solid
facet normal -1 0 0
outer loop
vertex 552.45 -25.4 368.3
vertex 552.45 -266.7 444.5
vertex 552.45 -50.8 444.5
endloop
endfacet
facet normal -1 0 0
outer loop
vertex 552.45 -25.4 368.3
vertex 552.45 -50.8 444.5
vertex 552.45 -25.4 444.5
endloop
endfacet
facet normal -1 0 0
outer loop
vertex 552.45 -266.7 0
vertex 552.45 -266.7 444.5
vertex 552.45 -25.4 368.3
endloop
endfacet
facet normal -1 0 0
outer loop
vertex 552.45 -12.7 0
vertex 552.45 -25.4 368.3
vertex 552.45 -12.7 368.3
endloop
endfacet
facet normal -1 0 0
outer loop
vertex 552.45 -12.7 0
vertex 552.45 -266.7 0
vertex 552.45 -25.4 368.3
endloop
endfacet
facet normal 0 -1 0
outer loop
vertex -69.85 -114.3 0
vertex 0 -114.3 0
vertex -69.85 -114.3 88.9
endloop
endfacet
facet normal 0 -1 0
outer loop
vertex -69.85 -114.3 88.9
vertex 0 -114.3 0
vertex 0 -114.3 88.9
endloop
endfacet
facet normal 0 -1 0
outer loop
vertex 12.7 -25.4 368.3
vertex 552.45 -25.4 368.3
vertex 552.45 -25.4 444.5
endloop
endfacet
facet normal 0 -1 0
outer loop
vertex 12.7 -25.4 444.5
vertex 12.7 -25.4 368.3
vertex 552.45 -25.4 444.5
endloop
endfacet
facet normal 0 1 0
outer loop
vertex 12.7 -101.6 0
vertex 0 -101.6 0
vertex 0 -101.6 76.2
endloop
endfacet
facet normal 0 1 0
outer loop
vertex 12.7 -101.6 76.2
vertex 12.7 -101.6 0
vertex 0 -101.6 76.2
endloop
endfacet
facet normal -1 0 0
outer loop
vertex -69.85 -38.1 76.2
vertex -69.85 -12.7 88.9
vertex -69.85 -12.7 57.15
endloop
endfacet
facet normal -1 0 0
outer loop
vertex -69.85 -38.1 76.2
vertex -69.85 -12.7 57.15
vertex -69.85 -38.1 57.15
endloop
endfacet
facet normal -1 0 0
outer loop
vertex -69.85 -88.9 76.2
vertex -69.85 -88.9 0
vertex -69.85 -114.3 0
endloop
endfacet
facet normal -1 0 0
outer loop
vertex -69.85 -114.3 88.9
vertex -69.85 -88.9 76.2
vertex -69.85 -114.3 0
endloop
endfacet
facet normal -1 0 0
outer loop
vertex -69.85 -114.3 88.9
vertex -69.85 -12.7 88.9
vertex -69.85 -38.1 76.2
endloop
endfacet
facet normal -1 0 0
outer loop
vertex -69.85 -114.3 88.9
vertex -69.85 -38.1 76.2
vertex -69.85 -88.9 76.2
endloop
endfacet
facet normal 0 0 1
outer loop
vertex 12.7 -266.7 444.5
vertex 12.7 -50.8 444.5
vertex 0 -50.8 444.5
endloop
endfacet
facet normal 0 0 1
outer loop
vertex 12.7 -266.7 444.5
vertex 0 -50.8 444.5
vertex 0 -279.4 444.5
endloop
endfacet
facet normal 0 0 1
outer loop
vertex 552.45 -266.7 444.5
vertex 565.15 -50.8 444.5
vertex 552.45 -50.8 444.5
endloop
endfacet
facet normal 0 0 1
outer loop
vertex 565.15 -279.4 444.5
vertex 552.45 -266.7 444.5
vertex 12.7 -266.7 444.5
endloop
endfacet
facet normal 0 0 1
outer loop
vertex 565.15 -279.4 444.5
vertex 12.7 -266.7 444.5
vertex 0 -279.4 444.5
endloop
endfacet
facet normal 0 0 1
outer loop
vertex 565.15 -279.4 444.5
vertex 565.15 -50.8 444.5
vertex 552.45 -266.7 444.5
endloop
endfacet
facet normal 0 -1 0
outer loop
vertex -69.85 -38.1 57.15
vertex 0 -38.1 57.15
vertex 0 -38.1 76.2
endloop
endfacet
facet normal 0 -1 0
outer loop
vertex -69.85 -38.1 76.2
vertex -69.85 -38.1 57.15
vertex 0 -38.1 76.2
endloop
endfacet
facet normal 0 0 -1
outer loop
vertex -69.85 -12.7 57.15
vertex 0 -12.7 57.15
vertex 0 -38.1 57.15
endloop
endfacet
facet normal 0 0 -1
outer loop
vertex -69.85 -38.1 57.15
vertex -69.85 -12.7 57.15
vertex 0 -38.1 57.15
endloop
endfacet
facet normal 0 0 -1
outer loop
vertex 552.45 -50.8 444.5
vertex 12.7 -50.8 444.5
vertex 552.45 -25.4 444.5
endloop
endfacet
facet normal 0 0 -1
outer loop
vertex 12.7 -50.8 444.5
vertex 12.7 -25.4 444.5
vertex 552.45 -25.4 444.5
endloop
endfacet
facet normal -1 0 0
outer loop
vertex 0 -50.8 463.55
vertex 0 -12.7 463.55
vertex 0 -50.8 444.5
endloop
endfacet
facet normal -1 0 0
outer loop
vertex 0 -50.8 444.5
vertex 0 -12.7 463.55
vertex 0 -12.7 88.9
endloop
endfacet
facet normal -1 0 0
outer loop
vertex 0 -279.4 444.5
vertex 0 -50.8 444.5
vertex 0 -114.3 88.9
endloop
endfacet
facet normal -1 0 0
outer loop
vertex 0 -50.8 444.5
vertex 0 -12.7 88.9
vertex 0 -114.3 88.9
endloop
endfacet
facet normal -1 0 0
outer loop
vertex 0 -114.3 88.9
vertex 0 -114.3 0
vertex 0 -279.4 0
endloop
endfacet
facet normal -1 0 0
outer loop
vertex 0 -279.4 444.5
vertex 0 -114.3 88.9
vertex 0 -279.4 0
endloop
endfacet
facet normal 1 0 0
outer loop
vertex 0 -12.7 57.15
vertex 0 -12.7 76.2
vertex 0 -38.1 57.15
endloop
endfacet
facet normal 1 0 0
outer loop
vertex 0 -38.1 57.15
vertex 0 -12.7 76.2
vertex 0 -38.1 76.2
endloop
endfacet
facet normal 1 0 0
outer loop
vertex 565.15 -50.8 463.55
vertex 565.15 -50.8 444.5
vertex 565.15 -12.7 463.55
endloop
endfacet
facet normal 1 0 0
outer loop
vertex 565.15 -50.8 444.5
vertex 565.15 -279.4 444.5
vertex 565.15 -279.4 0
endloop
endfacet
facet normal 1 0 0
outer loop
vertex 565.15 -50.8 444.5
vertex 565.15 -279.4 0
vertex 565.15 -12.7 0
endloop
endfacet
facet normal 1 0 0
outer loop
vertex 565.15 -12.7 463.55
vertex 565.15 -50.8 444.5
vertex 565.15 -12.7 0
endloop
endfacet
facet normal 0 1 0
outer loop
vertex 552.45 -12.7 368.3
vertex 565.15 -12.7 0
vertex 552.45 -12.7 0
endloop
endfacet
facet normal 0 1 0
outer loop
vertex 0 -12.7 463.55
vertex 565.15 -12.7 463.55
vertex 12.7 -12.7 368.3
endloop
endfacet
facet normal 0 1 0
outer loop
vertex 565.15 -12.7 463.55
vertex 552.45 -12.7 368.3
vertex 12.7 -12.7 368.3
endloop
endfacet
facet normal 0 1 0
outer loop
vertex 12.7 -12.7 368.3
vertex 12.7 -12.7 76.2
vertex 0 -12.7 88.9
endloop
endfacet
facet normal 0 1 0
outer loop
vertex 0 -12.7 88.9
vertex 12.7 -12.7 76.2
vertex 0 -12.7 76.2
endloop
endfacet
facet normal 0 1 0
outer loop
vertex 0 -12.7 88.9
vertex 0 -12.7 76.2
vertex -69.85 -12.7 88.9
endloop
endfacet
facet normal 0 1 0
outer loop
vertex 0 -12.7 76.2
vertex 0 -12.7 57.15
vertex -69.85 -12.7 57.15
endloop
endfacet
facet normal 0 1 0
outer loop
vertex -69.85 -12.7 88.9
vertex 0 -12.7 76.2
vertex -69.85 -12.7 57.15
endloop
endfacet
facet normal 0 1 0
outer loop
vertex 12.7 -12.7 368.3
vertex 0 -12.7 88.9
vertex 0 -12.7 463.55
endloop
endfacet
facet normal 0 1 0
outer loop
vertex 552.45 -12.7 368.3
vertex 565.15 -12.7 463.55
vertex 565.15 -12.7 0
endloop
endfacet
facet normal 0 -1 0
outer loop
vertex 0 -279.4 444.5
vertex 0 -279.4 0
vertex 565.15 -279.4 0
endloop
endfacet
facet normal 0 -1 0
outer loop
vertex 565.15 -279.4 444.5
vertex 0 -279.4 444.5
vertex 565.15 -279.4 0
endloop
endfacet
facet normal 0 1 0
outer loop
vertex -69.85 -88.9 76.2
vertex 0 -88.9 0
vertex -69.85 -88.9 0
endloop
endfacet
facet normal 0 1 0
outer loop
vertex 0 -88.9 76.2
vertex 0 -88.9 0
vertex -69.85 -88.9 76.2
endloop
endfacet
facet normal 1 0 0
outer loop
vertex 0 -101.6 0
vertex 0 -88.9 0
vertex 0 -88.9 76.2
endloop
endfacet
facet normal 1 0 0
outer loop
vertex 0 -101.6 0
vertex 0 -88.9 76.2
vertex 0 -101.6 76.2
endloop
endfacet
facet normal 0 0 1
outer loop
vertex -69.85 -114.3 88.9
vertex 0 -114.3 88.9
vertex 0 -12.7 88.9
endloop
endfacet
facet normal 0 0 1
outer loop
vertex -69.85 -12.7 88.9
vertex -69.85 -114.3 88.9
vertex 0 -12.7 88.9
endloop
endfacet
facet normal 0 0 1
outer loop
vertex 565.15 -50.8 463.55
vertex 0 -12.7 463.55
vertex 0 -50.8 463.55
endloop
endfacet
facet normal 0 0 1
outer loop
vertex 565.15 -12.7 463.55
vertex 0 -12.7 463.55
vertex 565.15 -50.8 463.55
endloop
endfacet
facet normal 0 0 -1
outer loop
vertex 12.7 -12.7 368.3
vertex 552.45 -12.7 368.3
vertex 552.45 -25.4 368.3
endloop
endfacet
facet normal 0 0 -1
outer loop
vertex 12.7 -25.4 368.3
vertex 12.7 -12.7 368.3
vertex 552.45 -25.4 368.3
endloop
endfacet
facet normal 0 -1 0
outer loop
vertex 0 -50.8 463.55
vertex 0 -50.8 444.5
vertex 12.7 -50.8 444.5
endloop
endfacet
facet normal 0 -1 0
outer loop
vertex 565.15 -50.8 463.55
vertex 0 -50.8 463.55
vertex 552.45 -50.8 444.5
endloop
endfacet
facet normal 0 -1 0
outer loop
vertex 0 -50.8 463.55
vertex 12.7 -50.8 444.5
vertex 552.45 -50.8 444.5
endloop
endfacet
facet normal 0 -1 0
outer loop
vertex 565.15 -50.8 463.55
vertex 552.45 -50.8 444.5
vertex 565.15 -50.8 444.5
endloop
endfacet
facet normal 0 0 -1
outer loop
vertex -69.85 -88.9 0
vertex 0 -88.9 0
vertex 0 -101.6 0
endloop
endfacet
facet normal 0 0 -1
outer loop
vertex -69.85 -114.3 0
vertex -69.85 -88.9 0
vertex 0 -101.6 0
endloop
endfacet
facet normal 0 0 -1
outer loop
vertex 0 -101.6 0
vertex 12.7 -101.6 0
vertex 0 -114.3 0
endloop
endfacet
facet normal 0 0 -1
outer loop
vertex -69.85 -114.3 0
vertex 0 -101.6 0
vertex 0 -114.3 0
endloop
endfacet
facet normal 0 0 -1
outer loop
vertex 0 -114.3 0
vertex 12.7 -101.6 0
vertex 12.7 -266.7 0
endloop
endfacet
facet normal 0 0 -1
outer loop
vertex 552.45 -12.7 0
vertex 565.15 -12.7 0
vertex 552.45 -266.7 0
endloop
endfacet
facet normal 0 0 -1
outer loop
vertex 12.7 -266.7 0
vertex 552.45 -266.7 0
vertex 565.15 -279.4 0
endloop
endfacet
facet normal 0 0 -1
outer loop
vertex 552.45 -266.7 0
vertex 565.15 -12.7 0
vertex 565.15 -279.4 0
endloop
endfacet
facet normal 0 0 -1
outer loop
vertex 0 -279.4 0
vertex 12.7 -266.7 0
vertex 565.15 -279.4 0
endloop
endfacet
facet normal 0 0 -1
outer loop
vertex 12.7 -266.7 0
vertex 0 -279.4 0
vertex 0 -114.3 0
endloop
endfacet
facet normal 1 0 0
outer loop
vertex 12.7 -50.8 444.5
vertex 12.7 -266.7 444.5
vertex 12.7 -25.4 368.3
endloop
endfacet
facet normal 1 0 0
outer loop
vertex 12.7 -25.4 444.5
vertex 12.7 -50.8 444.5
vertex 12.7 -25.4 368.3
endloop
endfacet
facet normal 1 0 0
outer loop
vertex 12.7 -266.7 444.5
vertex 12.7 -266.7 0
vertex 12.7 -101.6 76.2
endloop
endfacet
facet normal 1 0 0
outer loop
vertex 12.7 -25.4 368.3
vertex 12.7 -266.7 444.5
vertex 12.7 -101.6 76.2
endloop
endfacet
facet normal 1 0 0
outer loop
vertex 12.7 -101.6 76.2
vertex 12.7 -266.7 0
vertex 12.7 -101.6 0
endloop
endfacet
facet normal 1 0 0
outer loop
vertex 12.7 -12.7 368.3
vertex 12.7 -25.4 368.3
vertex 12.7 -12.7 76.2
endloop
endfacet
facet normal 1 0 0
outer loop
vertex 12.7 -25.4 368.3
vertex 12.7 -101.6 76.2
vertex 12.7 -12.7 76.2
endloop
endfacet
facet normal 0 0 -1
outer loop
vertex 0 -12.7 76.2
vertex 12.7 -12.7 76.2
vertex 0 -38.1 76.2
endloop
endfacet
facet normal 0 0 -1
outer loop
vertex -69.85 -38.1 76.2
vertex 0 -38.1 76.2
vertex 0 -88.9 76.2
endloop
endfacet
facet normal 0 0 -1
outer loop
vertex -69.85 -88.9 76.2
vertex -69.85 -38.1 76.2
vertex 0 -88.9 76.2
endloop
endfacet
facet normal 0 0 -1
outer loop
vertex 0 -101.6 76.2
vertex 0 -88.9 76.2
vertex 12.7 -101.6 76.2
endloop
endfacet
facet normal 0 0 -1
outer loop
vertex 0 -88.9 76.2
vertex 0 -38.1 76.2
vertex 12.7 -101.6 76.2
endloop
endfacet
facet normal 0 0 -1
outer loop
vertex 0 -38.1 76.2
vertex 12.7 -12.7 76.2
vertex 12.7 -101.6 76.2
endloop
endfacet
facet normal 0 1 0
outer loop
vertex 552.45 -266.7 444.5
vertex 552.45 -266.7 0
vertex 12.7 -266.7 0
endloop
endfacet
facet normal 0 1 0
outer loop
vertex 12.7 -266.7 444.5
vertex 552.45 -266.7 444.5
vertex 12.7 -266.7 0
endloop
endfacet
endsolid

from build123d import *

# Parameters (mm, degrees)
F0_W     = 12.7
F0_H     = 254
F1_DEPTH = 444.5
F2_W     = 101.6
F2_H     = 76.2
F3_DEPTH = 12.7
F4_W     = 25.4
F4_H     = 19.05
F4_W_2   = 12.7
F4_H_2   = 76.2
F5_DEPTH = 69.85
F6_W     = 12.7
F6_H     = 76.2
F7_DEPTH = 539.75
F8_W     = 539.75
F8_H     = 25.4
F9_DEPTH = 19.05


with BuildPart() as f1:
    # F0 (on Top) → F1 (new body)
    with BuildSketch(Plane.XY):
        with Locations((6.35, -139.7)):
            Rectangle(F0_W, F0_H)
        Polygon((12.7, -266.7), (0, -266.7), (0, -279.4), (565.15, -279.4), (565.15, -266.7), (552.45, -266.7), align=None)
        with Locations((558.8, -139.7)):
            Rectangle(F0_W, F0_H)
    extrude(amount=F1_DEPTH)

    # F2 (on face) → F3 (cut, through all)
    with BuildSketch(Plane(origin=(0, 0, 0), x_dir=(0, -1, 0), z_dir=(-1, 0, 0))):
        with Locations((50.8, 38.1)):
            Rectangle(F2_W, F2_H)
    extrude(amount=-F3_DEPTH, mode=Mode.SUBTRACT)

    # F4 (on face) → F5 (join)
    with BuildSketch(Plane(origin=(0, 0, 0), x_dir=(0, -1, 0), z_dir=(-1, 0, 0))):
        Polygon((101.6, 0), (114.3, 0), (114.3, 88.9), (12.7, 88.9), (12.7, 76.2), (38.1, 76.2), (88.9, 76.2), (101.6, 76.2), align=None)
        with Locations((25.4, 66.675)):
            Rectangle(F4_W, F4_H)
        with Locations((95.25, 38.1)):
            Rectangle(F4_W_2, F4_H_2)
    extrude(amount=F5_DEPTH)

    # F6 (on face) → F7 (join, through all)
    with BuildSketch(Plane(origin=(552.45, 0, 0), x_dir=(0, -1, 0), z_dir=(-1, 0, 0))):
        with Locations((19.05, 406.4)):
            Rectangle(F6_W, F6_H)
    extrude(amount=F7_DEPTH)

    # F8 (on face) → F9 (join)
    with BuildSketch(Plane.XY.offset(444.5)):
        with Locations((282.575, -38.1)):
            Rectangle(F8_W, F8_H)
        Polygon((565.15, -12.7), (0, -12.7), (0, -50.8), (12.7, -50.8), (12.7, -25.4), (552.45, -25.4), (552.45, -50.8), (565.15, -50.8), align=None)
    extrude(amount=F9_DEPTH)


solid = f1.part
